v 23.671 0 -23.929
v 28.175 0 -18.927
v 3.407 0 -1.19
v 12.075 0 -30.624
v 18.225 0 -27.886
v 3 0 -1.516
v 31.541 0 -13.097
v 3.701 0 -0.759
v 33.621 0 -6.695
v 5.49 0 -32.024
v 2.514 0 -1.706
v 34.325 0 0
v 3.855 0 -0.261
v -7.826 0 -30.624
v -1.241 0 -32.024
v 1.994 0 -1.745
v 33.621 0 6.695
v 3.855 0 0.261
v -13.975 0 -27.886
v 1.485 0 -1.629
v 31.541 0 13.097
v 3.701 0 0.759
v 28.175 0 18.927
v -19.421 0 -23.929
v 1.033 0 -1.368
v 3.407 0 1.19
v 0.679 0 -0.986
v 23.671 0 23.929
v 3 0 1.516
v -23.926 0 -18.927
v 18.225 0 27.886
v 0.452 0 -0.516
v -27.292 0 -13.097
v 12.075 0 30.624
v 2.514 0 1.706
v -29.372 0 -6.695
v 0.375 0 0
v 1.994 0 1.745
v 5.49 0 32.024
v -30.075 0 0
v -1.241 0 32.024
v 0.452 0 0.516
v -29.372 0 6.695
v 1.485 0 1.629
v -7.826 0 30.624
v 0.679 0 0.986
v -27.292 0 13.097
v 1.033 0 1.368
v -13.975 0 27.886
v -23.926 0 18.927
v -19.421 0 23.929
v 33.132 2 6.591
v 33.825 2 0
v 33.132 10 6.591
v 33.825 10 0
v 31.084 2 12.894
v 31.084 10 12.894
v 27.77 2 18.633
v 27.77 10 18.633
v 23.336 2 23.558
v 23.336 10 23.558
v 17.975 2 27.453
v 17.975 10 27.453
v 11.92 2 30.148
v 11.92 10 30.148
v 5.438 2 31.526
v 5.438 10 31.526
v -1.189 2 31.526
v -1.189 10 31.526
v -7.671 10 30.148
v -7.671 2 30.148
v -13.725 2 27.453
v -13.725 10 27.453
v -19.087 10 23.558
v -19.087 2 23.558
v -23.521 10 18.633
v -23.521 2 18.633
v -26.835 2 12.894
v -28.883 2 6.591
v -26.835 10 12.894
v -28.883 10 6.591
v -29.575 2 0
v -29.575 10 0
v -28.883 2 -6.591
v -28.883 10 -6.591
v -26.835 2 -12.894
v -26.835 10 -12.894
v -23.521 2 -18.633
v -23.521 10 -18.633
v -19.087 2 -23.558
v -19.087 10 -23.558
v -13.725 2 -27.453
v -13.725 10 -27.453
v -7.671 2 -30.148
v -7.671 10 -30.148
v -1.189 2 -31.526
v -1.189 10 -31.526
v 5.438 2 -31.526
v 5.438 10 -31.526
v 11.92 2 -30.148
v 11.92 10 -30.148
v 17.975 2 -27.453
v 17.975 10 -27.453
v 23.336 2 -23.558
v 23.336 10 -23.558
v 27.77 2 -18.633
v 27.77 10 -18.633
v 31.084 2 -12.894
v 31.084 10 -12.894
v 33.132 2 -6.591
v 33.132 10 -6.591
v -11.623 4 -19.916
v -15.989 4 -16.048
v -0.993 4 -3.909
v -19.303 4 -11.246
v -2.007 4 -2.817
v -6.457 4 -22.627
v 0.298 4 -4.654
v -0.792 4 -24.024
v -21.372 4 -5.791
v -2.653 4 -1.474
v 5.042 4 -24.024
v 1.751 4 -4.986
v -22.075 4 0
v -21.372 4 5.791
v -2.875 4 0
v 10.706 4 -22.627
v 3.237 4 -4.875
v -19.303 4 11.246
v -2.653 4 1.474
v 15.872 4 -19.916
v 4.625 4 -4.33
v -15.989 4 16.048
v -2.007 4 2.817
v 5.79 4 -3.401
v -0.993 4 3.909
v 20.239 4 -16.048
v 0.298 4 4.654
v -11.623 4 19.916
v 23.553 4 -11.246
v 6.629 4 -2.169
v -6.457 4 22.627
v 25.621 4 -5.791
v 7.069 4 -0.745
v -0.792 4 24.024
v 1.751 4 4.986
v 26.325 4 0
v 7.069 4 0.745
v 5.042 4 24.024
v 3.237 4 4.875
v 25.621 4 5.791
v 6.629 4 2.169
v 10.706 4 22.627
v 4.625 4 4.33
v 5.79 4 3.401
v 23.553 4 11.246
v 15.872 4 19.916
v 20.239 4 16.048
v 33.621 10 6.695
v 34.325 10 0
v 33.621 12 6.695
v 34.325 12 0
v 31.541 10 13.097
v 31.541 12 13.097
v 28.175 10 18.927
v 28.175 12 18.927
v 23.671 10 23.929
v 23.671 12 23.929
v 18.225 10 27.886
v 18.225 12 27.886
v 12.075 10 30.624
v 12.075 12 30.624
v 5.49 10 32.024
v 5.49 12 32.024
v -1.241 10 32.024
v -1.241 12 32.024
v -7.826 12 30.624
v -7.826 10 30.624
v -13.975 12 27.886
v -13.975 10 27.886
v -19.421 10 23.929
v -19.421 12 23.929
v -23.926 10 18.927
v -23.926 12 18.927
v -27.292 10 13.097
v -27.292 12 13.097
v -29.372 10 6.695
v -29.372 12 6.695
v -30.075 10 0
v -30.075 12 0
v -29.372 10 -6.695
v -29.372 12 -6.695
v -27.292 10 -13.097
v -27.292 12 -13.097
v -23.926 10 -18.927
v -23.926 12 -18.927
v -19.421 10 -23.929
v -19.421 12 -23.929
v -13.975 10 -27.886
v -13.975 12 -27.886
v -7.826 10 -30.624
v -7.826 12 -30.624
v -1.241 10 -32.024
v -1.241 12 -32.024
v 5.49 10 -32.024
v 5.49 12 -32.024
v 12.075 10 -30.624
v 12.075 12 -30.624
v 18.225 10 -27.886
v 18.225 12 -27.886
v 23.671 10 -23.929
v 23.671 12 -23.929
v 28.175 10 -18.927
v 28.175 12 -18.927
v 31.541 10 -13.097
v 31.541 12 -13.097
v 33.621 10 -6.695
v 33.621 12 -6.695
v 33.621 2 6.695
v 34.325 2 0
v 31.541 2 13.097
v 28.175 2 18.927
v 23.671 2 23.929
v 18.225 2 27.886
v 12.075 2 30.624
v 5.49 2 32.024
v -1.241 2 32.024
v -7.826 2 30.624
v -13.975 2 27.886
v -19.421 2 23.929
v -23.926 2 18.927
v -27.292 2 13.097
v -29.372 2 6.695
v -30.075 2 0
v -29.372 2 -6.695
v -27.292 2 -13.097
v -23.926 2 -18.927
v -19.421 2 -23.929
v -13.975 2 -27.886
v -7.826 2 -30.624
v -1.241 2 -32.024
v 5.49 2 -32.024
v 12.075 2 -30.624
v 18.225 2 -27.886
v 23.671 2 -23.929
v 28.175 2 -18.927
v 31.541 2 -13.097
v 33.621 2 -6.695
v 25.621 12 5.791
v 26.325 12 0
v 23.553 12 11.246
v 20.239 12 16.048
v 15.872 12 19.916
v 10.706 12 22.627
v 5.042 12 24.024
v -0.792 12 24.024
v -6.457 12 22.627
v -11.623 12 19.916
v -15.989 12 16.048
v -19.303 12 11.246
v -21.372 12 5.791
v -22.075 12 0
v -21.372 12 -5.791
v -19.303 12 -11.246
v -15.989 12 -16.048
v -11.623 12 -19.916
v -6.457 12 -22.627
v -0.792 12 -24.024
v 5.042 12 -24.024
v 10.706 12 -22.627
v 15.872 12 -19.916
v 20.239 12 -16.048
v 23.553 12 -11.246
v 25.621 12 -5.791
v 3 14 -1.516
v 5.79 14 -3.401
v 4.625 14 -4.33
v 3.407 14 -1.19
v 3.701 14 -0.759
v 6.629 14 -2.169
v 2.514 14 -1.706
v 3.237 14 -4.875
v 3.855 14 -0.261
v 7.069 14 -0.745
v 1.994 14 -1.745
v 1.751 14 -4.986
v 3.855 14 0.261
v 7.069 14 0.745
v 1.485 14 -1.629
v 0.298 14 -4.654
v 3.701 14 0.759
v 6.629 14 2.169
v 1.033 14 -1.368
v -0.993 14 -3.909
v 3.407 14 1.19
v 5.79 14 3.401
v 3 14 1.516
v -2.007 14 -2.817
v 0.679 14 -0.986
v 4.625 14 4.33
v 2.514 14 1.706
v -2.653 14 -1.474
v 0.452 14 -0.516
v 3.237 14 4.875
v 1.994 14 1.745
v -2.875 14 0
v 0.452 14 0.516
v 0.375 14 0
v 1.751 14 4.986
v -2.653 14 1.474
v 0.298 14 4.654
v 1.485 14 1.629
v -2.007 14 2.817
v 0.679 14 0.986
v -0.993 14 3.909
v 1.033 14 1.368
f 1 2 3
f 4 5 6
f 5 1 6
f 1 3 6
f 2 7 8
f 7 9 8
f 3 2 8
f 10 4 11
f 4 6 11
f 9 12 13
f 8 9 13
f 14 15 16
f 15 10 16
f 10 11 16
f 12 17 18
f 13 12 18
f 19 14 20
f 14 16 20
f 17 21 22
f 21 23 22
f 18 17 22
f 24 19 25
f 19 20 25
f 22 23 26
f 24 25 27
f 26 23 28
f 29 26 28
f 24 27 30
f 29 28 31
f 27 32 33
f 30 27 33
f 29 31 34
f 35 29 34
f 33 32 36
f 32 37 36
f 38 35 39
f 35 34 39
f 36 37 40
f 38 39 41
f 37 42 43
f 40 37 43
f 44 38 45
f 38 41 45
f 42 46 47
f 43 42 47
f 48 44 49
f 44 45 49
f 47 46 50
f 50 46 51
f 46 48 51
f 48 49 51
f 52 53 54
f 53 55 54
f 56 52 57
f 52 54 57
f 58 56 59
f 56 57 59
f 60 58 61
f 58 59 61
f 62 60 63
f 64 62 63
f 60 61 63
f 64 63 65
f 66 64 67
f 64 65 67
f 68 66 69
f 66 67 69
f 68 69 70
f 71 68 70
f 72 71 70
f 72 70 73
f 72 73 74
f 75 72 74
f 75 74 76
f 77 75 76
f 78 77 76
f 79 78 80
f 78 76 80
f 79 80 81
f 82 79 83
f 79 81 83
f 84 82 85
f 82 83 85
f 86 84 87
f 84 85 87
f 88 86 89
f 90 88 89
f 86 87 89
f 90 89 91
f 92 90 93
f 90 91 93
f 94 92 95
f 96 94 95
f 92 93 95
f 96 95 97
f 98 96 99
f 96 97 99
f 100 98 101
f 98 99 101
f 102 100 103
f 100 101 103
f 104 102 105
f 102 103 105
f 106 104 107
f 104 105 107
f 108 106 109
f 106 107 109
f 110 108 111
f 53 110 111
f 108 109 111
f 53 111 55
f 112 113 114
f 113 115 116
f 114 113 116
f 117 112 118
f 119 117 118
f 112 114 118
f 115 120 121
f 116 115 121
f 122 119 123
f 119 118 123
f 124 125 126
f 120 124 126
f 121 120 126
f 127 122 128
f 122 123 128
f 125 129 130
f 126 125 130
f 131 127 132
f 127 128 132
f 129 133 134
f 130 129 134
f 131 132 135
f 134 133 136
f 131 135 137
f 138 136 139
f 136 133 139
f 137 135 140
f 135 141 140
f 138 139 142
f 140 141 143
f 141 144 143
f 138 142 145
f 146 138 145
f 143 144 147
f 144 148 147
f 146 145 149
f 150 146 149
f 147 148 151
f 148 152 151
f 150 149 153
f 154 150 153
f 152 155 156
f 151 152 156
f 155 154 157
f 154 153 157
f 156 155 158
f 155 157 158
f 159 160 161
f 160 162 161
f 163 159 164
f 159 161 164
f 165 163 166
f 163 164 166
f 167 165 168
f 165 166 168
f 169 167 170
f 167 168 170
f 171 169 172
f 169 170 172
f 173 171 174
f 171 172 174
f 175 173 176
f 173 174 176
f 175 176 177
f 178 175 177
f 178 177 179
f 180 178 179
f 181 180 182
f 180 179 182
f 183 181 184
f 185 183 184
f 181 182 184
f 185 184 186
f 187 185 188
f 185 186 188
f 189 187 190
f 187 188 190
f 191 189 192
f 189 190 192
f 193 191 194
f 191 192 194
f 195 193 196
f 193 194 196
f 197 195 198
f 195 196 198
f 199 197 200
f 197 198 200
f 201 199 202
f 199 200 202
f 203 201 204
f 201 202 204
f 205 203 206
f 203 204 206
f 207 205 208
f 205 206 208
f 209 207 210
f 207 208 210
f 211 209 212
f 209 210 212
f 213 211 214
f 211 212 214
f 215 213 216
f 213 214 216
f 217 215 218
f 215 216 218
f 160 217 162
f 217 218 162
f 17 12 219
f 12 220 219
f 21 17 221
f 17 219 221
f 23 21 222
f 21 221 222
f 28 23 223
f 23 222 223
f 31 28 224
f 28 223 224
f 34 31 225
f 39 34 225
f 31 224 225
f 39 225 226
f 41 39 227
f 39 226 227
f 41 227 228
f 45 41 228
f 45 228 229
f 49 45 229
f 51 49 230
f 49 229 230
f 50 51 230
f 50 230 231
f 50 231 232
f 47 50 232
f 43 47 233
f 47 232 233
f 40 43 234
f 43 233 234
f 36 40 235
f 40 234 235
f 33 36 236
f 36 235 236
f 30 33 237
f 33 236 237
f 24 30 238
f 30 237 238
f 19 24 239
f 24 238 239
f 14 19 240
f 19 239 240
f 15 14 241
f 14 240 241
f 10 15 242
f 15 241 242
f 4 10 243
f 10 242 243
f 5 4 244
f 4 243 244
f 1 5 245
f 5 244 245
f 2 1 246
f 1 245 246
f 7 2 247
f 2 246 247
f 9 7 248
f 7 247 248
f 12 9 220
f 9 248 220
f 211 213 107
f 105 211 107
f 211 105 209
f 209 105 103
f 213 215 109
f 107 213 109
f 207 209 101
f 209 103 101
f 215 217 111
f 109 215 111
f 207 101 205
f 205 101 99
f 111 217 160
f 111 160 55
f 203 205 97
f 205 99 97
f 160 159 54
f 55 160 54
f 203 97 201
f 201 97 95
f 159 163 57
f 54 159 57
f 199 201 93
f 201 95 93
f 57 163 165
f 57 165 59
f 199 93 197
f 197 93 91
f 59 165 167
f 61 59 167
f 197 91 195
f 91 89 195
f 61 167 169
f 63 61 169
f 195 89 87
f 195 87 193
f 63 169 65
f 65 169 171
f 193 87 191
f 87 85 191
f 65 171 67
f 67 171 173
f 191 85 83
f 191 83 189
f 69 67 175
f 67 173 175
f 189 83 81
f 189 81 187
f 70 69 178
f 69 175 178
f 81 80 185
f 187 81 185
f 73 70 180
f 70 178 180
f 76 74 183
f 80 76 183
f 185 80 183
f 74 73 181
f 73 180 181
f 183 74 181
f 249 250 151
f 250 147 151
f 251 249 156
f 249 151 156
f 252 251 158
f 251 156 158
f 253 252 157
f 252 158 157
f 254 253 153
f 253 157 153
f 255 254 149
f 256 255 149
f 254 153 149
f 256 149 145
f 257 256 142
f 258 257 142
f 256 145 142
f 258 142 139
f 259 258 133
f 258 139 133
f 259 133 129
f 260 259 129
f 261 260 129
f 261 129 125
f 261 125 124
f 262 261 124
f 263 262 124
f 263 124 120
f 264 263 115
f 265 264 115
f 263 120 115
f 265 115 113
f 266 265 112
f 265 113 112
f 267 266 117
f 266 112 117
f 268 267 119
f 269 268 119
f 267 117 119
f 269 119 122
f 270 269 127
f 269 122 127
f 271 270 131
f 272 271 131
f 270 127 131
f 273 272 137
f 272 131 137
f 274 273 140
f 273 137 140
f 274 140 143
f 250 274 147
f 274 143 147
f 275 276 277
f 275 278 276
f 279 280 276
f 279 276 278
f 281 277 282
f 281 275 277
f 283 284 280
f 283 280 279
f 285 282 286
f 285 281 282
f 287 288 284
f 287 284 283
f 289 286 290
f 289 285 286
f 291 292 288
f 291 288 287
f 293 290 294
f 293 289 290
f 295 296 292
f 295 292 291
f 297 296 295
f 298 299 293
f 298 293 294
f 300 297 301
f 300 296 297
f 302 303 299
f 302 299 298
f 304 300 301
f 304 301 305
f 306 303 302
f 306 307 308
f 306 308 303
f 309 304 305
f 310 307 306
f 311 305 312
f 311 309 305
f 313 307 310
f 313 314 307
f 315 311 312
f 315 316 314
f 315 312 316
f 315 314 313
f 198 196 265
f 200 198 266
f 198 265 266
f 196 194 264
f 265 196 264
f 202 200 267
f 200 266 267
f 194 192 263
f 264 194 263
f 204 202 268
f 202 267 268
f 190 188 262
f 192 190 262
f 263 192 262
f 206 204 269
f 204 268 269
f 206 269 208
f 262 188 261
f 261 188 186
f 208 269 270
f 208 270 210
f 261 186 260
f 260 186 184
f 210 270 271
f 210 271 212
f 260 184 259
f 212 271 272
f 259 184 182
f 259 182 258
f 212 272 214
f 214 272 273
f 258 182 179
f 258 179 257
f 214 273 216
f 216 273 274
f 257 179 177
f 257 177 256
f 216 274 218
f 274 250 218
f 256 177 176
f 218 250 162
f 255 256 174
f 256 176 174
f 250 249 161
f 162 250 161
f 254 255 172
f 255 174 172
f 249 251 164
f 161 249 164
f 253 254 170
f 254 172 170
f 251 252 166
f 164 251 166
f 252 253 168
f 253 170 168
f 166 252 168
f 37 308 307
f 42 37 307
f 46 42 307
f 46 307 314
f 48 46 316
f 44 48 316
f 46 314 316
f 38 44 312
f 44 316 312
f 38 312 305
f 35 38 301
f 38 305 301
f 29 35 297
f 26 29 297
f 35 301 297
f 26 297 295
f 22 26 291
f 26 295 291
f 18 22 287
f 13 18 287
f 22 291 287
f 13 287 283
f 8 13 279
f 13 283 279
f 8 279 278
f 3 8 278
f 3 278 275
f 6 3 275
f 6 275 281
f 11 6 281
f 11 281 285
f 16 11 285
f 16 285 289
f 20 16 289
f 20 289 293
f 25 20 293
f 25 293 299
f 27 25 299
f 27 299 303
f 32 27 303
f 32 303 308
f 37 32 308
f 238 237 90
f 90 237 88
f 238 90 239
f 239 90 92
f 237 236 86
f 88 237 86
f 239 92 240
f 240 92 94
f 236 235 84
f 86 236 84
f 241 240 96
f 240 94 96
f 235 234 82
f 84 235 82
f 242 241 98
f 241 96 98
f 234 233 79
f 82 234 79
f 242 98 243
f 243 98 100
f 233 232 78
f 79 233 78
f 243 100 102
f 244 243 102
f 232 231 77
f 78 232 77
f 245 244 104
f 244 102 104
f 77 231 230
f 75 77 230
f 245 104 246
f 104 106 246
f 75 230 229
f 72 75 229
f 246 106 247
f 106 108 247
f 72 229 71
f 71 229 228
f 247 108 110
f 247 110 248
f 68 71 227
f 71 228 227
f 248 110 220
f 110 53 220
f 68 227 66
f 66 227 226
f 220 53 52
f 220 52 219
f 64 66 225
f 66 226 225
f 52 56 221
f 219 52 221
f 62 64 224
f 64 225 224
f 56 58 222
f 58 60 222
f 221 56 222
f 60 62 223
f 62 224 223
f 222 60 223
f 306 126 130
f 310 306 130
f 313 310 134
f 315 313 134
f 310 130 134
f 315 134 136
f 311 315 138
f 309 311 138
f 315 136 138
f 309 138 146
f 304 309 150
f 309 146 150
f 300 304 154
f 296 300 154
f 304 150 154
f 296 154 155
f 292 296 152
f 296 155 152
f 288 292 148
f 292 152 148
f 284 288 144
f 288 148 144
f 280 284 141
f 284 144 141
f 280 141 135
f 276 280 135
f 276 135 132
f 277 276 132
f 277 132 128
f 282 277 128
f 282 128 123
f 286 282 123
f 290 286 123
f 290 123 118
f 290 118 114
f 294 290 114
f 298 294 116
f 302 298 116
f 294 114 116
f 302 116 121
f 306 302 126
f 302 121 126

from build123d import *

# Parameters (mm, degrees)
F2_R     = 5
F3_DEPTH = 10
F4_R     = 1.75
F5_DEPTH = 25


with BuildPart() as f1:
    # F0 (on Top) → F1 (revolve)
    with BuildSketch(Plane.XY):
        Polygon((2.124551, 4), (2.124551, 0), (34.324551, 0), (34.324551, 2), (33.824551, 2), (33.824551, 10), (34.324551, 10), (34.324551, 12), (26.324551, 12), (26.324551, 4), align=None)
    revolve(axis=Axis((2.124551, 2, 0), (0, -1, 0)))

    # F2 (on face) → F3 (join)
    with BuildSketch(Plane(origin=(0, 4, 0), x_dir=(-1, 0, 0), z_dir=(0, 1, 0))):
        with Locations((-2.124551, 0)):
            Circle(F2_R)
    extrude(amount=F3_DEPTH)

    # F4 (on face) → F5 (cut)
    with BuildSketch(Plane(origin=(0, 14, 0), x_dir=(-1, 0, 0), z_dir=(0, 1, 0))):
        with Locations((-2.124551, 0)):
            Circle(F4_R)
    extrude(amount=-F5_DEPTH, mode=Mode.SUBTRACT)


solid = f1.part
